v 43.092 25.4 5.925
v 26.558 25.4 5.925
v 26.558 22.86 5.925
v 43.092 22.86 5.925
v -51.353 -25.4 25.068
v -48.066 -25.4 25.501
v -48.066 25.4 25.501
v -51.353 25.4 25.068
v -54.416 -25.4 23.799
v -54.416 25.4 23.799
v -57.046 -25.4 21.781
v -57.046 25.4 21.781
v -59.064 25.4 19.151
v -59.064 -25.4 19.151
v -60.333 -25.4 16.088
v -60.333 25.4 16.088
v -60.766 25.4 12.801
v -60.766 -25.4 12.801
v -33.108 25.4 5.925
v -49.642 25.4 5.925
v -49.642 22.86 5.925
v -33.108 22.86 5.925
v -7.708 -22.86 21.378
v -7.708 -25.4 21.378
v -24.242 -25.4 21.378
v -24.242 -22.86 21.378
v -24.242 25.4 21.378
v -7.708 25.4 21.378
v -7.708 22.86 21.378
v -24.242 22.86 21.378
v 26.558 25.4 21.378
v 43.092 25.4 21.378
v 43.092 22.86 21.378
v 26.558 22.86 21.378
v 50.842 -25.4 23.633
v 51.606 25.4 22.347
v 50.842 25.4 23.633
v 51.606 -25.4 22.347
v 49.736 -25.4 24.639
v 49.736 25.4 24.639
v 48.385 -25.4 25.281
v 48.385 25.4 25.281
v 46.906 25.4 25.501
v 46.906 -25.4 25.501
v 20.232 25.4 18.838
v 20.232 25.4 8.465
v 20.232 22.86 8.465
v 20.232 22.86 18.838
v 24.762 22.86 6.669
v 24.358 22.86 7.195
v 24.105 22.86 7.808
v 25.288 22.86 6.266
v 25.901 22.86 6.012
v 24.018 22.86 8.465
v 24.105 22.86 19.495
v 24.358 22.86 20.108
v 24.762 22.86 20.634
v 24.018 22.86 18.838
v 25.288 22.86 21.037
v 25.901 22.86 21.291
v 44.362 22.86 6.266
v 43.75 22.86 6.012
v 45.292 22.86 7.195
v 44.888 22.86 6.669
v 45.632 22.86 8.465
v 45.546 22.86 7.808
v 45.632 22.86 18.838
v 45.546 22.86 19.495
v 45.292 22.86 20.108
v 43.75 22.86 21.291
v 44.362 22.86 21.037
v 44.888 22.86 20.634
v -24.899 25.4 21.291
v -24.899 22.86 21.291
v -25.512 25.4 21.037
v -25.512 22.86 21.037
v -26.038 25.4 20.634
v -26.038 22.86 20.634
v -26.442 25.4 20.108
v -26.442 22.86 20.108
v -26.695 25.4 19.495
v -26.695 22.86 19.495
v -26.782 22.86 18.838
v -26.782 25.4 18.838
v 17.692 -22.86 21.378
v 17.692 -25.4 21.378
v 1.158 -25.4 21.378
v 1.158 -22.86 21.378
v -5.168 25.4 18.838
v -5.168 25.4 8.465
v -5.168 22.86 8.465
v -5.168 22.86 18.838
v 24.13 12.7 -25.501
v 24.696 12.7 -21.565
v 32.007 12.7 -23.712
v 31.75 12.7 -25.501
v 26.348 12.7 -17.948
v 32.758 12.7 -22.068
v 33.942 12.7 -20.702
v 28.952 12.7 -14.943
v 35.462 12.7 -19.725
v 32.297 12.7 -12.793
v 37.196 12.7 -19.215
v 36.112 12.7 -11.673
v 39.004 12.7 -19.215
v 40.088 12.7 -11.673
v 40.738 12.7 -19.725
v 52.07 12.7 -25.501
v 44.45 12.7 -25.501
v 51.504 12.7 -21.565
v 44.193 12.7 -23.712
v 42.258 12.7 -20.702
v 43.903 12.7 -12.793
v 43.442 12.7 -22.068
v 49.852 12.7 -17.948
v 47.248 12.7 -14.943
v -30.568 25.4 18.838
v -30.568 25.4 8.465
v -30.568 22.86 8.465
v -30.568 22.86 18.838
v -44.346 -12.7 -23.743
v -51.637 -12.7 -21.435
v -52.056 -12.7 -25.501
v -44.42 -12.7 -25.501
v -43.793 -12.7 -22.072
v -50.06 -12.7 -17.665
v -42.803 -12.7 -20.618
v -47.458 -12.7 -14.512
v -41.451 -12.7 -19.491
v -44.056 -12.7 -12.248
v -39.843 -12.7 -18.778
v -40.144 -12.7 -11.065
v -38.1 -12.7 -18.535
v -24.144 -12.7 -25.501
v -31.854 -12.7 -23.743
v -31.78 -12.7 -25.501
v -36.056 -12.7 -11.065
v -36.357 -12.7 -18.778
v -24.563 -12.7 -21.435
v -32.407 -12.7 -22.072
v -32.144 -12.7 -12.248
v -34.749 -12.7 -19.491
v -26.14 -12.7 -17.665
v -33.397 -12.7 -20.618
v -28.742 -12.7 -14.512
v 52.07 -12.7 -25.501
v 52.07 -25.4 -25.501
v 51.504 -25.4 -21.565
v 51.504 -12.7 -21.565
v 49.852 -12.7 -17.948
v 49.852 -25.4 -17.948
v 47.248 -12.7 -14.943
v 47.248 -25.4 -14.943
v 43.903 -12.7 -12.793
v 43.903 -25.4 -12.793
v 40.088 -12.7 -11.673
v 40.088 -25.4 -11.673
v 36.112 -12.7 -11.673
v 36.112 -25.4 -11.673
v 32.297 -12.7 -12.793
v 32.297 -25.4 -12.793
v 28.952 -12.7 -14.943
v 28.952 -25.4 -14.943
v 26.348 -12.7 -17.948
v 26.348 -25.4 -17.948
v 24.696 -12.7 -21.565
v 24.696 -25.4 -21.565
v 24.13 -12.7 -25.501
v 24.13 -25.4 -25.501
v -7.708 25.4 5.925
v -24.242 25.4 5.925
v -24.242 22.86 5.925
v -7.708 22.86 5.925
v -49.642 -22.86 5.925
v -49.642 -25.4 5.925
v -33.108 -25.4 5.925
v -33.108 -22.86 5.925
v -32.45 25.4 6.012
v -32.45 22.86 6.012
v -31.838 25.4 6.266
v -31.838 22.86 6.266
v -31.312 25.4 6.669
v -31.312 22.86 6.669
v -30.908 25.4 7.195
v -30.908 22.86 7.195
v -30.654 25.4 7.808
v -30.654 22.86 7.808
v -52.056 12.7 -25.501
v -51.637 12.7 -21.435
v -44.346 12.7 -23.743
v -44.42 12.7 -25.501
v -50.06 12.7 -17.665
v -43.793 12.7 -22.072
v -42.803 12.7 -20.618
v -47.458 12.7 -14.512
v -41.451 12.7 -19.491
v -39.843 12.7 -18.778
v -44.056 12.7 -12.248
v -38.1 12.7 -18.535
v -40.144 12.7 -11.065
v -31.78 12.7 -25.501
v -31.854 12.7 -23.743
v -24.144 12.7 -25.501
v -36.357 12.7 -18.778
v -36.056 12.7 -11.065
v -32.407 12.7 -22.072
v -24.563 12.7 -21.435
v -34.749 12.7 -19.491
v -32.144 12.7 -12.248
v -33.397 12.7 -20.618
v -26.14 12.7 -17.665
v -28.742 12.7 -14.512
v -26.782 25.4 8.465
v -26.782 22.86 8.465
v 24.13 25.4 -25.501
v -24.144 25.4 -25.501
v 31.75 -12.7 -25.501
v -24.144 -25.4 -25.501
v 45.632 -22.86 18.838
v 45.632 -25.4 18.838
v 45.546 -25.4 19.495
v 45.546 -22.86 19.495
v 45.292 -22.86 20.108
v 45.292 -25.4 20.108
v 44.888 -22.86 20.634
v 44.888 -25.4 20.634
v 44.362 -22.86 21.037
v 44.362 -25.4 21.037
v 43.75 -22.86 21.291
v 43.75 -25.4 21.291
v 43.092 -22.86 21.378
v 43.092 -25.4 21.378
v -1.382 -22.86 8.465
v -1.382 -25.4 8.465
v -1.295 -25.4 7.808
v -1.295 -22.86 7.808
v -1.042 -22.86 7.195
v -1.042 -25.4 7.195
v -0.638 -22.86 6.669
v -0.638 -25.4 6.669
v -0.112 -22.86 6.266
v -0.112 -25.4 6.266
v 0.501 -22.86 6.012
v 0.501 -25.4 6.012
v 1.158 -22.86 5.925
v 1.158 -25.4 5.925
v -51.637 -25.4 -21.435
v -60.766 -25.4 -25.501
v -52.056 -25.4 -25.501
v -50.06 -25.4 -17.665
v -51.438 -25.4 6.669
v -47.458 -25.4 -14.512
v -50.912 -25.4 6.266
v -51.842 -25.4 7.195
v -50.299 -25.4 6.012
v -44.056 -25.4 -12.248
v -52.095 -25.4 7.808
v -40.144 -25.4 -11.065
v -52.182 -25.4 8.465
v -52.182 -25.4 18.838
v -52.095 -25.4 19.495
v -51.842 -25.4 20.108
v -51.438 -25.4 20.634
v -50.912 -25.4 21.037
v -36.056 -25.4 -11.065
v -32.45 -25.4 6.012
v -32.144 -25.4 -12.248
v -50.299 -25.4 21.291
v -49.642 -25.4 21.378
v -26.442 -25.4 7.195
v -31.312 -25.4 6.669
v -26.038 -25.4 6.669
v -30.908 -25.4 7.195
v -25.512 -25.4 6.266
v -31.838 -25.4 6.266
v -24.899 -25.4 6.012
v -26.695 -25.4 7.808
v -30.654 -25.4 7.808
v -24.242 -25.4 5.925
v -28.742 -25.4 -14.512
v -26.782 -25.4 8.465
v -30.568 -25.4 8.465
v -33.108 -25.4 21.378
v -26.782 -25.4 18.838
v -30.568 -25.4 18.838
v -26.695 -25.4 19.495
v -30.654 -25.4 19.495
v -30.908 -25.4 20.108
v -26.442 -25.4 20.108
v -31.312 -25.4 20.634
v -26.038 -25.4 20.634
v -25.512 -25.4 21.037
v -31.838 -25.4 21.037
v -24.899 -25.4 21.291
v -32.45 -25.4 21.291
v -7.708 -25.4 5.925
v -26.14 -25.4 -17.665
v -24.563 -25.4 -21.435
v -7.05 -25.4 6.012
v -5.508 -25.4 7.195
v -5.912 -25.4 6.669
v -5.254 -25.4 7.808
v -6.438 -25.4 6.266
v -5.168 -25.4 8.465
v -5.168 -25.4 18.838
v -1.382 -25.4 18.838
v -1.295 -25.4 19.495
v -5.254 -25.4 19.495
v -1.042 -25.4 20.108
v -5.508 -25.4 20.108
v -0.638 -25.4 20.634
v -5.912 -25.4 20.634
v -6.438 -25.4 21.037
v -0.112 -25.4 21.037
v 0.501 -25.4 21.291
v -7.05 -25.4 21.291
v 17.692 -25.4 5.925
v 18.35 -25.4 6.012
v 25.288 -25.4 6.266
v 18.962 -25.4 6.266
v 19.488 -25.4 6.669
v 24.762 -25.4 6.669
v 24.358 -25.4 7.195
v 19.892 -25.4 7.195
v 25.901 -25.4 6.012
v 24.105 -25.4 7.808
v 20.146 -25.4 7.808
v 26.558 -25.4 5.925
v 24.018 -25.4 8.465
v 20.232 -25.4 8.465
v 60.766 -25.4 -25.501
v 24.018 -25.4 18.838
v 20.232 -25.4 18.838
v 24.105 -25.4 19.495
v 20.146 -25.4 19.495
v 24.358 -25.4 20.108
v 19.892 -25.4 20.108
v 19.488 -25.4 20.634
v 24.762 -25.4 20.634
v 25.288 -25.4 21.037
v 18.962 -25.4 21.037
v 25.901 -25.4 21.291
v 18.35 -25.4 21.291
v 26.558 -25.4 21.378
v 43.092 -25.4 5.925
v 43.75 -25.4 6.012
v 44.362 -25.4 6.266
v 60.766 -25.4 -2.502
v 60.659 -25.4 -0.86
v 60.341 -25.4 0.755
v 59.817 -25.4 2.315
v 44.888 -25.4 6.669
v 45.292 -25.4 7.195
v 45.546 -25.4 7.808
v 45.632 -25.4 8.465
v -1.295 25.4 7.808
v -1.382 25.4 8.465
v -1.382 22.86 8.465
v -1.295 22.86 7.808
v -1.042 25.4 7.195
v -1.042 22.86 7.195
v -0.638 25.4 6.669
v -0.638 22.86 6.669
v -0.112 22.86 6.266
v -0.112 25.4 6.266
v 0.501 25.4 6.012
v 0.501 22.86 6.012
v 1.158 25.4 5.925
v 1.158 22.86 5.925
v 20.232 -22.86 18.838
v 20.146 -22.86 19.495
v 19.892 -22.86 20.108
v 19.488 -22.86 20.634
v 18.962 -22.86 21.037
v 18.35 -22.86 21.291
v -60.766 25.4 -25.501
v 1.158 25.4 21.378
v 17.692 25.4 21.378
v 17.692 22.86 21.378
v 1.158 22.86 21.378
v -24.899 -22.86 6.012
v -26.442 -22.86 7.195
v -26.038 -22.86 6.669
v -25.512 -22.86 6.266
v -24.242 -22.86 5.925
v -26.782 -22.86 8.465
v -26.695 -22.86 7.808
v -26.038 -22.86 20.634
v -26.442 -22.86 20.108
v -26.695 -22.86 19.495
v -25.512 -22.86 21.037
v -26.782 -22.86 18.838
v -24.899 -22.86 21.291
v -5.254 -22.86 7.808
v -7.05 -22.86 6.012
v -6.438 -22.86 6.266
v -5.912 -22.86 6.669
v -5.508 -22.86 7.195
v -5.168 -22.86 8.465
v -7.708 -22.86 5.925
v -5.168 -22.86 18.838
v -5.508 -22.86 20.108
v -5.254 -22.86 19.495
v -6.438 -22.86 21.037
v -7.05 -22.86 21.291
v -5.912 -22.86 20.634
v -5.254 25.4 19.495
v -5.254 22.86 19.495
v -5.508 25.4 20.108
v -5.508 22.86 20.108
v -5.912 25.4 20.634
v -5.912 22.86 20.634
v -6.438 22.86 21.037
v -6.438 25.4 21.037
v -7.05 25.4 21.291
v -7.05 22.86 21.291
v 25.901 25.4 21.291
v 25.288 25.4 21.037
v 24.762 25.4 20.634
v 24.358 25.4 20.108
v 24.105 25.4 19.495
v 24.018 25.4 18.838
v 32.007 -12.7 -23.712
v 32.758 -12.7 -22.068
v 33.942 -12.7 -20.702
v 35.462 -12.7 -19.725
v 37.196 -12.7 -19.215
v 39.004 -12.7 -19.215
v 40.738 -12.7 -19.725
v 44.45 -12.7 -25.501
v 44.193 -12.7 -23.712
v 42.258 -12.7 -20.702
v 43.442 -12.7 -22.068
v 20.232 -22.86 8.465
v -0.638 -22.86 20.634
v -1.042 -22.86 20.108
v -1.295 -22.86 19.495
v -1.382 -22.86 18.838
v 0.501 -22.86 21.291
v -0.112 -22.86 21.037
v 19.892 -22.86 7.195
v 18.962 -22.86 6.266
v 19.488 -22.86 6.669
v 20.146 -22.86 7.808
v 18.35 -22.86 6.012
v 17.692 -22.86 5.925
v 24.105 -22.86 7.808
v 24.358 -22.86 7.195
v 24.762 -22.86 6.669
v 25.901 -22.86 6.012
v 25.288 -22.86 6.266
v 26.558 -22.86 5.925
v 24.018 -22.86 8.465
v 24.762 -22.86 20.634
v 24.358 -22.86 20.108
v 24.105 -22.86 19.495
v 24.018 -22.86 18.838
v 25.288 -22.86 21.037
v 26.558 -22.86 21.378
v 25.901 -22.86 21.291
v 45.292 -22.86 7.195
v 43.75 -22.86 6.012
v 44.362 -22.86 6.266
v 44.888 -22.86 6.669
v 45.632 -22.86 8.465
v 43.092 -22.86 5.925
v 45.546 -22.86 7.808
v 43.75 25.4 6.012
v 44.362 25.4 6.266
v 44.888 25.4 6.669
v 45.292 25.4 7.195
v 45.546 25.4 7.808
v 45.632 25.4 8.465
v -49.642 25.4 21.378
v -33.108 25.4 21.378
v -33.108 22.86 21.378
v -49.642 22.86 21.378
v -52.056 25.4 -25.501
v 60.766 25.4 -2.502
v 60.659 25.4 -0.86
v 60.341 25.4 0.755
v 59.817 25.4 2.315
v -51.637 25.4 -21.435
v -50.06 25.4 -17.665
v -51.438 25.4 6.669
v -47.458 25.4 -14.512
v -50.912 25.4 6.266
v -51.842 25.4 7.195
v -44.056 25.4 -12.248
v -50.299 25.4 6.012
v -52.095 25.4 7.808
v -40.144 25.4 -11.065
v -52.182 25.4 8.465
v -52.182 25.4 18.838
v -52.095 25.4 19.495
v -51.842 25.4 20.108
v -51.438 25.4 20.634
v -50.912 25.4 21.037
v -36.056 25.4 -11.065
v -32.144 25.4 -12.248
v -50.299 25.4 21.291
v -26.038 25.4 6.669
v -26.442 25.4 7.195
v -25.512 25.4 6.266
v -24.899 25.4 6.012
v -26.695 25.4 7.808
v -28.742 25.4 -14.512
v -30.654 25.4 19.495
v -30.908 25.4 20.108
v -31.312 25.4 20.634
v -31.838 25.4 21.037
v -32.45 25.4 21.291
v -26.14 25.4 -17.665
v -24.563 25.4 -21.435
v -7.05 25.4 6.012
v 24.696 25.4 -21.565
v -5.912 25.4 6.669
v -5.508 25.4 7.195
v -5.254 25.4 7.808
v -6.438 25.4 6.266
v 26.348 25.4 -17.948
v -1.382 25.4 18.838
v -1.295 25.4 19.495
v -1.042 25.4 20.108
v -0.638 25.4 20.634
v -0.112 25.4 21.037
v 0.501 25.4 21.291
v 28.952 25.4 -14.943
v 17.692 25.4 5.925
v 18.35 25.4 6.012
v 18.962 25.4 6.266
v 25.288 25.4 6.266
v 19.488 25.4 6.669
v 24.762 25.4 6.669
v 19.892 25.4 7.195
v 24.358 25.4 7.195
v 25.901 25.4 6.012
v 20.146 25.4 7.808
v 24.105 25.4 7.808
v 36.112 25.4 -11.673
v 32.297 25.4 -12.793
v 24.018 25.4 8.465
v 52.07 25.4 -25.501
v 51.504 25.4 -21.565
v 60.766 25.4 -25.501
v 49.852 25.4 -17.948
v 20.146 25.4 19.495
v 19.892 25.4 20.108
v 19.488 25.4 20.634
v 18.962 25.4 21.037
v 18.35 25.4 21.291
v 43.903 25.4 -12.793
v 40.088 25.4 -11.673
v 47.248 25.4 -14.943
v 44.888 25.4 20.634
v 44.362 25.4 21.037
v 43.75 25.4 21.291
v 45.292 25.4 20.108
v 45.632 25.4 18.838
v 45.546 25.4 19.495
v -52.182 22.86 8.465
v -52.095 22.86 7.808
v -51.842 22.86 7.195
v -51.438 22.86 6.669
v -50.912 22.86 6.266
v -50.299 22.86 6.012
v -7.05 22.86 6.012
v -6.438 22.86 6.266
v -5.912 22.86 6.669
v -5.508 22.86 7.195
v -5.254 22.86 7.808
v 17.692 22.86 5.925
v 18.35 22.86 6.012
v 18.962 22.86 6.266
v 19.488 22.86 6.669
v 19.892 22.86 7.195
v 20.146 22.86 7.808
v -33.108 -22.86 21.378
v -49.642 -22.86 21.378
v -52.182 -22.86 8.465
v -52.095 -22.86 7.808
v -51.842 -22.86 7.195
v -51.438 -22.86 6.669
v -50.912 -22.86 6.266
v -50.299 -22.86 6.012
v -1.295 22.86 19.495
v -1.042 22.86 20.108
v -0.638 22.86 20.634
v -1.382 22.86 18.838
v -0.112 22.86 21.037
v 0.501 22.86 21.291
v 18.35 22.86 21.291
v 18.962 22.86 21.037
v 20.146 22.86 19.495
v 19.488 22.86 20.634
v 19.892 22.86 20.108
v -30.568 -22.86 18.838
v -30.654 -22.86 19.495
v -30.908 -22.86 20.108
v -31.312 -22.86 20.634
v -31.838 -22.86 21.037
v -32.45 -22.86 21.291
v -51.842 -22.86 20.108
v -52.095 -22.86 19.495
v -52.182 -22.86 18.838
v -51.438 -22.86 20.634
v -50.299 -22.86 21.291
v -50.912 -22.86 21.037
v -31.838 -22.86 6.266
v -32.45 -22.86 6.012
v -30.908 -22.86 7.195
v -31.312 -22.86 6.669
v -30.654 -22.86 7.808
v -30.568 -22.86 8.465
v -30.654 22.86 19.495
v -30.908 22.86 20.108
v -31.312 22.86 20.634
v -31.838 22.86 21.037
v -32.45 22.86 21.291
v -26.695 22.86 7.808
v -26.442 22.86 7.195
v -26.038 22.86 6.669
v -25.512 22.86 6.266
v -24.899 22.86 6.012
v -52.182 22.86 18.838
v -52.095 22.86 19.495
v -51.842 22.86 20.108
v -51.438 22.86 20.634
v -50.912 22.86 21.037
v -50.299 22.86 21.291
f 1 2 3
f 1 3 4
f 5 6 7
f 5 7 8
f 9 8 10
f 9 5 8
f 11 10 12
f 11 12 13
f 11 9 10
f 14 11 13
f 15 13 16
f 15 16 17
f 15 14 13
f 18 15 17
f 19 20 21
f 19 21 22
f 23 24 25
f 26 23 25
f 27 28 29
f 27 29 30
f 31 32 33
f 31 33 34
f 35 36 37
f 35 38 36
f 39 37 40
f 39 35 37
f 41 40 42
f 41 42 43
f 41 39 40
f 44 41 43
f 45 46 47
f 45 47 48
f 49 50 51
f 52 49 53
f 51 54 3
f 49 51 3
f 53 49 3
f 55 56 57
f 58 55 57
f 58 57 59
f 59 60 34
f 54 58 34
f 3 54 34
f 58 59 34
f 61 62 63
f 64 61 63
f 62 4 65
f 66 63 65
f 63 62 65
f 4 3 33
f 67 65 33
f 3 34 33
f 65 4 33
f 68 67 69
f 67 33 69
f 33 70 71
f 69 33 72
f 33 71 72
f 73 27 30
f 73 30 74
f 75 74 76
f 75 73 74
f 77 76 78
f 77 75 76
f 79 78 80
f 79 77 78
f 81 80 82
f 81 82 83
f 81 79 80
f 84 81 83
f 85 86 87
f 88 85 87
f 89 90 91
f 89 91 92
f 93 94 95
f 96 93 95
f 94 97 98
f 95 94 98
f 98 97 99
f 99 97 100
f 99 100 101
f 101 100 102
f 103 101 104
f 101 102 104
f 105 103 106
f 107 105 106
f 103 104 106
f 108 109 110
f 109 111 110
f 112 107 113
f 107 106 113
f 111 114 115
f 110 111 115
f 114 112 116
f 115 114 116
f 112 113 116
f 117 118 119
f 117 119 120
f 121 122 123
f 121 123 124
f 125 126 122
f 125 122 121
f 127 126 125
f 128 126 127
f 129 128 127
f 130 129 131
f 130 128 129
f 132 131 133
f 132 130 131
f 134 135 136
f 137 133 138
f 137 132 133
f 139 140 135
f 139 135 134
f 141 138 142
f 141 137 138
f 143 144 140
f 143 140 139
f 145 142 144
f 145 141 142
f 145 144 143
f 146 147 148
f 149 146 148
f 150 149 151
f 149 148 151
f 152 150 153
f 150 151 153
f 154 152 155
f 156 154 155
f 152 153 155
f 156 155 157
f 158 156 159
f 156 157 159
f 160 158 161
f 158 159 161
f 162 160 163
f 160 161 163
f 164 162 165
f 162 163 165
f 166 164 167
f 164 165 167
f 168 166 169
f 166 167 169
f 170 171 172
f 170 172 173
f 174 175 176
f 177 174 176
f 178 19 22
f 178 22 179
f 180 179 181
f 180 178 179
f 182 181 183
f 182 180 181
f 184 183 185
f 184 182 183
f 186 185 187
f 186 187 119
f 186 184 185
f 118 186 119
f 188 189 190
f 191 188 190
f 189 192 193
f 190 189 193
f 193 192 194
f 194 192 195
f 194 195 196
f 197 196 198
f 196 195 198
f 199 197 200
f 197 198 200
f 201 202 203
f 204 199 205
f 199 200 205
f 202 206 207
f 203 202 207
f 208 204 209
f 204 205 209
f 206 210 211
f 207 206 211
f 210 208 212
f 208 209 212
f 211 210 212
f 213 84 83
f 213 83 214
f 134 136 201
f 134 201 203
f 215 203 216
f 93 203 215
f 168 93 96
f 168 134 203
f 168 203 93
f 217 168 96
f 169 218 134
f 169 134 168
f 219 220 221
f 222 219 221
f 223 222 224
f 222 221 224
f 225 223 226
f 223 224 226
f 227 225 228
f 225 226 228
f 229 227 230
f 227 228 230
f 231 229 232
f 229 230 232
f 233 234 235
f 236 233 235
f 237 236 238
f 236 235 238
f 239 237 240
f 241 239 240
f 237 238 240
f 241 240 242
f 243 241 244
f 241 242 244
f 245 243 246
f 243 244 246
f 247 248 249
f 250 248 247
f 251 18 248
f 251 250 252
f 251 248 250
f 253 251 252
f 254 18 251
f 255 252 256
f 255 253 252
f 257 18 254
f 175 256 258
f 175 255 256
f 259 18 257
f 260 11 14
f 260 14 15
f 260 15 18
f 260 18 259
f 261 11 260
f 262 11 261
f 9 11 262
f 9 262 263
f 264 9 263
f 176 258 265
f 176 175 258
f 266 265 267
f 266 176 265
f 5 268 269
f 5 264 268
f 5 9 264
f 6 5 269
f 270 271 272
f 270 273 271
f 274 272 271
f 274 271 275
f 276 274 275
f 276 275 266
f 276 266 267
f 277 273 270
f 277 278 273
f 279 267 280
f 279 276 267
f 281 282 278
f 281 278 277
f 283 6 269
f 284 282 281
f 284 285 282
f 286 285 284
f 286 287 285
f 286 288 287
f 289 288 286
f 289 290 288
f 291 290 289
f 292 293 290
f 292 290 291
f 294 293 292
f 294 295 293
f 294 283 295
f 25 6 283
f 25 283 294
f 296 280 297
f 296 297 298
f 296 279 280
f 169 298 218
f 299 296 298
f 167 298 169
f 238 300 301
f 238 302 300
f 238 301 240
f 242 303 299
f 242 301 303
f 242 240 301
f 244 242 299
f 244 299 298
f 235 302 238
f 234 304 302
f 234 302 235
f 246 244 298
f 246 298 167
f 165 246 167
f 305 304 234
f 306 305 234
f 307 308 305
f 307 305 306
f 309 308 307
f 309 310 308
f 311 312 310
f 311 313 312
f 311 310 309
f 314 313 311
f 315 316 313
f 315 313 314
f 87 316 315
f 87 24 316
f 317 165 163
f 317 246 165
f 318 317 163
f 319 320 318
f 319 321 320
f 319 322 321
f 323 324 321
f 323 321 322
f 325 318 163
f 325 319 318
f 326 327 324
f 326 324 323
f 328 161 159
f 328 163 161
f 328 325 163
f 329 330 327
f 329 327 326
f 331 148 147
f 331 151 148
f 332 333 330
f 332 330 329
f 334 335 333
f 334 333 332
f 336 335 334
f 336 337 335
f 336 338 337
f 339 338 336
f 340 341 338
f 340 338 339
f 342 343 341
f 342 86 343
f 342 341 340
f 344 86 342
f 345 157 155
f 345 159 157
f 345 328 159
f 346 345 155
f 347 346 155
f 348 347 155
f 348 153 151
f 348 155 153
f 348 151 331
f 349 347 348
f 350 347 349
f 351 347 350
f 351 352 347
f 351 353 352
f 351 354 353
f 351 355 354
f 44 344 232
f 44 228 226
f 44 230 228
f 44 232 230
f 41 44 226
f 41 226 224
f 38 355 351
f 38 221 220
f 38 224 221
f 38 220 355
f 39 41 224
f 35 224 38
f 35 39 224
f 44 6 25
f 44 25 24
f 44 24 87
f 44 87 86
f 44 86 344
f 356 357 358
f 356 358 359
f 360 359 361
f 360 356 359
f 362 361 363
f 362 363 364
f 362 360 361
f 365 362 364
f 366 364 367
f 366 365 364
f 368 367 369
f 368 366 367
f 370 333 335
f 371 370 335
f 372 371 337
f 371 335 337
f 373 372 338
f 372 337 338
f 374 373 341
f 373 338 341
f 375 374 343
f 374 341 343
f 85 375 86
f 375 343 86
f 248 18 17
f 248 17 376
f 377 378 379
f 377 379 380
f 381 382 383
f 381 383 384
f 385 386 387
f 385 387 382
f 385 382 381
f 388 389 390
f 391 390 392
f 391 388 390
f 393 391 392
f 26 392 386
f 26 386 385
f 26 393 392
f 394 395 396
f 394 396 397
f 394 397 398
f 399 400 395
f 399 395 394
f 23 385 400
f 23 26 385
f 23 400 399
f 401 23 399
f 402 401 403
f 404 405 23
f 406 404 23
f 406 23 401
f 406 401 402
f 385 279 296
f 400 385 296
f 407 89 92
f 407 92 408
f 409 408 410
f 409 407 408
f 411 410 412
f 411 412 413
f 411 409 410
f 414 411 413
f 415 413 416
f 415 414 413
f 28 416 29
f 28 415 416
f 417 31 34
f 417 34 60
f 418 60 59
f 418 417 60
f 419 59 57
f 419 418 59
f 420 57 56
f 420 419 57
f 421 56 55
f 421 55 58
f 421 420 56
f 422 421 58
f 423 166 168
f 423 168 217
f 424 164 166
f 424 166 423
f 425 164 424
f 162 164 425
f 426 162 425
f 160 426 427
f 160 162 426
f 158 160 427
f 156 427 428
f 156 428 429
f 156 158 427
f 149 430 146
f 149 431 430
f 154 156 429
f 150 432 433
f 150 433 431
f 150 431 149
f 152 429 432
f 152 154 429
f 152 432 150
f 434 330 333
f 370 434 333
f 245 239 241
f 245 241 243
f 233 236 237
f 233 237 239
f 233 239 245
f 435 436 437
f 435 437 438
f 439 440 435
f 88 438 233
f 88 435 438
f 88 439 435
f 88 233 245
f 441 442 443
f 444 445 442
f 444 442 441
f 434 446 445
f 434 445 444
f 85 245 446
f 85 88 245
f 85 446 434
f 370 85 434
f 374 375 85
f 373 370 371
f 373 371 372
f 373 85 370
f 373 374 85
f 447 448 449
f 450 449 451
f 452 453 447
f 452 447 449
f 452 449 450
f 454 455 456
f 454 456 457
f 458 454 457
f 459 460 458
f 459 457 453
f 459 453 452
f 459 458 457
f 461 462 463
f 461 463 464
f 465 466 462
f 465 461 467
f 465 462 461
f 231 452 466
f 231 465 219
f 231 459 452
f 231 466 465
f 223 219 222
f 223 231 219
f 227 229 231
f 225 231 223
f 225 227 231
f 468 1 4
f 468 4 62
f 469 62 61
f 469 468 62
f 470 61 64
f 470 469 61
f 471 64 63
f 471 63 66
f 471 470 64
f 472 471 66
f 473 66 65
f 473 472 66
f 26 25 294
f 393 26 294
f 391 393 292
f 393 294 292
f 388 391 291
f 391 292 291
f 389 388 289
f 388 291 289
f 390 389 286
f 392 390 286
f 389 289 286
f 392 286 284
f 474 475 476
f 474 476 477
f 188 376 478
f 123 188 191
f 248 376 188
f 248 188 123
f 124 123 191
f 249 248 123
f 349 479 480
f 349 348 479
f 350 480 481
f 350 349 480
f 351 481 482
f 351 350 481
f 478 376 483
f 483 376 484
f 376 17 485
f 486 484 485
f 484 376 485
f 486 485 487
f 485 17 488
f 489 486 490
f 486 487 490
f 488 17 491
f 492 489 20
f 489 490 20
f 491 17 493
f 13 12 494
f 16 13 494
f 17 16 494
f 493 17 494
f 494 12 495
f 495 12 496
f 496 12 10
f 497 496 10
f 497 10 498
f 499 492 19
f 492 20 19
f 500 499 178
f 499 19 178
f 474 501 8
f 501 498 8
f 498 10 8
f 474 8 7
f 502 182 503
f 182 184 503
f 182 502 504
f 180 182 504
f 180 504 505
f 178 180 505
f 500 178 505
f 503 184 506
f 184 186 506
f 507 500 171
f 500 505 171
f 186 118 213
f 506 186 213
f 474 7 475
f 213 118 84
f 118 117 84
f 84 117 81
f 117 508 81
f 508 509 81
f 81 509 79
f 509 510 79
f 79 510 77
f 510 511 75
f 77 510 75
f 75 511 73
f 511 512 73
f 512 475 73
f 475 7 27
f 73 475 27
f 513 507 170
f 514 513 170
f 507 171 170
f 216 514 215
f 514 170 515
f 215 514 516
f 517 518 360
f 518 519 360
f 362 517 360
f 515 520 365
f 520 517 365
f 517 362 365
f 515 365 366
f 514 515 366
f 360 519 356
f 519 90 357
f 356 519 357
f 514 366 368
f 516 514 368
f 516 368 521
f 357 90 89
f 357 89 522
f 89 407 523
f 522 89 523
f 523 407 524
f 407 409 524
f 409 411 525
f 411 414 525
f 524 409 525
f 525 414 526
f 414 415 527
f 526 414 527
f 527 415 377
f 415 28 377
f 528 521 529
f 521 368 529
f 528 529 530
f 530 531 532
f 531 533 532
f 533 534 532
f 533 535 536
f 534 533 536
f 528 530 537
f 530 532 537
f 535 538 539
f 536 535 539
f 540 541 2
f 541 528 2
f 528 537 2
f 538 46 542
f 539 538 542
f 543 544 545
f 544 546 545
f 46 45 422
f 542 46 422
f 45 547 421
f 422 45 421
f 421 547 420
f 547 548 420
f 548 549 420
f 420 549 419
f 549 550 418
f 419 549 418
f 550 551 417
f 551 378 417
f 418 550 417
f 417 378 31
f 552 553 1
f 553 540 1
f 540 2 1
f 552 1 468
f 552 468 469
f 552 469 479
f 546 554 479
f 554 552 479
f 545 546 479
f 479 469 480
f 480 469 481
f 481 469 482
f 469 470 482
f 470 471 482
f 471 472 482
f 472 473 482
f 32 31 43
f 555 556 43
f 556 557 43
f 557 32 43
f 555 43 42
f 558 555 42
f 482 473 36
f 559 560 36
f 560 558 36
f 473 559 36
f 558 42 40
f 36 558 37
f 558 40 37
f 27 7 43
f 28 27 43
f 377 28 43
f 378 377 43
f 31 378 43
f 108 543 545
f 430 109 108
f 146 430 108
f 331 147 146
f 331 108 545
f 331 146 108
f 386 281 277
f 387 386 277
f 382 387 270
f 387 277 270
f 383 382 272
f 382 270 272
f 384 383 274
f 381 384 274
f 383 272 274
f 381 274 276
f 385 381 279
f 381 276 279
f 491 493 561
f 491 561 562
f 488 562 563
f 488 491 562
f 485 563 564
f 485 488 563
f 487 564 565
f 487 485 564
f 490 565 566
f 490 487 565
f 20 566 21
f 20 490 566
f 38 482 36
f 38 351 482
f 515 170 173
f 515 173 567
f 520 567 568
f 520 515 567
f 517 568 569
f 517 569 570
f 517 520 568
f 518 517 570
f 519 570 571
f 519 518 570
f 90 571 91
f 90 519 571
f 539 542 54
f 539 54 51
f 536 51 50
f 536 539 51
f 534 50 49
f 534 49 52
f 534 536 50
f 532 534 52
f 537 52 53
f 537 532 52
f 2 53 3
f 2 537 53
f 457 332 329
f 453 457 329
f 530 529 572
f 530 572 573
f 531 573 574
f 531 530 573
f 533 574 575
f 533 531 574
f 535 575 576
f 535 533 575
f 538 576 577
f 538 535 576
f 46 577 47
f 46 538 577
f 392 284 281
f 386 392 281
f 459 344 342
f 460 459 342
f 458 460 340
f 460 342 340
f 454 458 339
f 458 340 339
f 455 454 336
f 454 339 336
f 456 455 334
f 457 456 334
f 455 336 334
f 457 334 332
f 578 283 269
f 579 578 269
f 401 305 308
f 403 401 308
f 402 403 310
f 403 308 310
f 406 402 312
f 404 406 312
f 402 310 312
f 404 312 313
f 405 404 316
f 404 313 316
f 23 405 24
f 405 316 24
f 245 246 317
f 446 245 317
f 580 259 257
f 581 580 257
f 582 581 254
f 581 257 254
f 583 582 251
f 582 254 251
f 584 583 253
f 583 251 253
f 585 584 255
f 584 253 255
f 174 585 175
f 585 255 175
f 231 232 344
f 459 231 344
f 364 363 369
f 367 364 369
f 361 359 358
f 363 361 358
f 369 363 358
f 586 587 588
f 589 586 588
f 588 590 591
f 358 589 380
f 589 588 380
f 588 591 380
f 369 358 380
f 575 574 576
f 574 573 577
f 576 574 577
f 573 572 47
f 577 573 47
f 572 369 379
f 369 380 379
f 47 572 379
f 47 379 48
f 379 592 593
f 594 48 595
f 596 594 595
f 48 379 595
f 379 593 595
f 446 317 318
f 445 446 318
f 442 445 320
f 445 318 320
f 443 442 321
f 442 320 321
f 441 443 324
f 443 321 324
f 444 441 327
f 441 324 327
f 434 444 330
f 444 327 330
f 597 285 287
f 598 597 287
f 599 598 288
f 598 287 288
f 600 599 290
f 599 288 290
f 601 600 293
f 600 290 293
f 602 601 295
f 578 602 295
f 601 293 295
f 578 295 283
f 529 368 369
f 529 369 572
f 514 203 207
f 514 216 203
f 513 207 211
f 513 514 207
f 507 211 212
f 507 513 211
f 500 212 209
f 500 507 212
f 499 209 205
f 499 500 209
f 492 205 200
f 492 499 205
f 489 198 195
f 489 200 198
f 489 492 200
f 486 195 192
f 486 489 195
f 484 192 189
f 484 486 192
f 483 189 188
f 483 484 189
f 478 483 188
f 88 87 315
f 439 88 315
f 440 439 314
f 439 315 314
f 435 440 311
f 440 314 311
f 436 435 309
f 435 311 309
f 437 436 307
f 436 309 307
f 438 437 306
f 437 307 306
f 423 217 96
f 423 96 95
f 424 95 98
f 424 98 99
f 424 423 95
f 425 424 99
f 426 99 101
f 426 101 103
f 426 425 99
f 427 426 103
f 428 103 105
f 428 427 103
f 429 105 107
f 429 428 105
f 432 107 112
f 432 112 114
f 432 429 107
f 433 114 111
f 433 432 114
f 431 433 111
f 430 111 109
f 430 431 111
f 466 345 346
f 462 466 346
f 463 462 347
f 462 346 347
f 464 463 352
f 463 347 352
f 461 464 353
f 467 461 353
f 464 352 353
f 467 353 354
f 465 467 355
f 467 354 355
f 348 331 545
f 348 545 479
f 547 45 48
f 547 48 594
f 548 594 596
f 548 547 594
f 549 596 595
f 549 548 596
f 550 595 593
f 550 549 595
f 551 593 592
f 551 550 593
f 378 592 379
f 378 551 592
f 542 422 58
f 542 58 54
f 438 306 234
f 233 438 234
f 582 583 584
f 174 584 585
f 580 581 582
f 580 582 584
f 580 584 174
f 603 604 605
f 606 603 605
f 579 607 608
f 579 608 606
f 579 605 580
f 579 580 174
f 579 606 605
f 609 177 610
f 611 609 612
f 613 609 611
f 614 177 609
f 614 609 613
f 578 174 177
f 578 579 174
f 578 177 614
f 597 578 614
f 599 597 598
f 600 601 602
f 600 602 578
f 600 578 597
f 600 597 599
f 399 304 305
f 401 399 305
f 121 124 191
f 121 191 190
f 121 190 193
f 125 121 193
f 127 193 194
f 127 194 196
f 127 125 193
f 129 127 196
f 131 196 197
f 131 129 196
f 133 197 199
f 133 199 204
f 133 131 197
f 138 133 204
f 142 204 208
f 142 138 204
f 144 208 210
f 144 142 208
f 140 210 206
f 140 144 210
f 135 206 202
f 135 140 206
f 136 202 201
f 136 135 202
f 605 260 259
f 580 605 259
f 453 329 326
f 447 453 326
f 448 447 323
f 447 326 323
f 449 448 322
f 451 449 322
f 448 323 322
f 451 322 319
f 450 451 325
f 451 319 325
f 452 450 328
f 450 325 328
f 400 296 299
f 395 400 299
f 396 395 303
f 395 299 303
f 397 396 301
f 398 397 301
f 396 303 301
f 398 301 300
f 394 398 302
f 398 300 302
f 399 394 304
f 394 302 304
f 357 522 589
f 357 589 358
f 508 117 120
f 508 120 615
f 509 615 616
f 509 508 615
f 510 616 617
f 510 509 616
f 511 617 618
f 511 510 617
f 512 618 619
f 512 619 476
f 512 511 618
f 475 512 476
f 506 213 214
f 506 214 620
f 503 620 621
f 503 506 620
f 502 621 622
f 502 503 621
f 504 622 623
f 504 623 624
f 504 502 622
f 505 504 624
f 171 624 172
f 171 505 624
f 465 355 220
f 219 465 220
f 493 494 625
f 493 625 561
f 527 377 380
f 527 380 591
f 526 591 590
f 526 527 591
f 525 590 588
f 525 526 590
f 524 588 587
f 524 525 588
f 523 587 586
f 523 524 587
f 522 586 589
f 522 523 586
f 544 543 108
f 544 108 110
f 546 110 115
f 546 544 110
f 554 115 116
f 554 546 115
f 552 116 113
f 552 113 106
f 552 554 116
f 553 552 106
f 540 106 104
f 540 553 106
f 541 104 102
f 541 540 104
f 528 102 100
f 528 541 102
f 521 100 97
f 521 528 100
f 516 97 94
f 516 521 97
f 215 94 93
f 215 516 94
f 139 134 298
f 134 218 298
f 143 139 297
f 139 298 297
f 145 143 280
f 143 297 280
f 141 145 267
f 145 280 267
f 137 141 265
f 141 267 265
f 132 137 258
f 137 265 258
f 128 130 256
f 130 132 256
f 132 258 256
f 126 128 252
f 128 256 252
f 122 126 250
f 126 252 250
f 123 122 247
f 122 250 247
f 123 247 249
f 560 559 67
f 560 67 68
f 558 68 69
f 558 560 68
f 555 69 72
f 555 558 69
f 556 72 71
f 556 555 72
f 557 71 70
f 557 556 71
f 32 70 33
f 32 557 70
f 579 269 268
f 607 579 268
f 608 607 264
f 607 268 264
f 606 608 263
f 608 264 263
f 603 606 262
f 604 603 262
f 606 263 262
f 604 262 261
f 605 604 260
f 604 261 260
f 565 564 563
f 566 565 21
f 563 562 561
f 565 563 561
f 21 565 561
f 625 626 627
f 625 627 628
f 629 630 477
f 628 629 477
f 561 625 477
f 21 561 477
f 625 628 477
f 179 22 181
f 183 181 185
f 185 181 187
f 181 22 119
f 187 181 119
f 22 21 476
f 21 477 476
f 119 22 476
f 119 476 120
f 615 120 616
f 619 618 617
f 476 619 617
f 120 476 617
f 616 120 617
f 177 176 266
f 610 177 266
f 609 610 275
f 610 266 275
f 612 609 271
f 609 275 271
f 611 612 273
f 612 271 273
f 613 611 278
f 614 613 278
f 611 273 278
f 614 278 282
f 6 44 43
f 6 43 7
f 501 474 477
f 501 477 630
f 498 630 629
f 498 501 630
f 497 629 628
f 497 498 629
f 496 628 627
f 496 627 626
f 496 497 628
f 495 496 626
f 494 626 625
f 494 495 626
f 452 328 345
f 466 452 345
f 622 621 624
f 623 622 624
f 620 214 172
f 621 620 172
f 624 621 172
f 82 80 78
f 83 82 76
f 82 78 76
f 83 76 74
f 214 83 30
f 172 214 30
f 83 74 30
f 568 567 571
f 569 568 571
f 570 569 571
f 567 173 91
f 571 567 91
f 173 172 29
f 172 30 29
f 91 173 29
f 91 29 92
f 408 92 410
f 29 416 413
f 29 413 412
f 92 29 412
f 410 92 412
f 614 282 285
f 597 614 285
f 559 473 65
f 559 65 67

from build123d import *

# Parameters (mm, degrees)
F1_DEPTH = 25.4
F3_DEPTH = 2.54
F4_R     = 13.97
F5_DEPTH = 12.7


with BuildPart() as f1:
    # F0 (on Front) → F1 (new body)
    with BuildSketch(Plane.XZ):
        with BuildLine():
            ThreePointArc((51.606199, 22.347435), (49.735838, 24.639444), (46.905716, 25.500817))
            Line((46.905716, 25.500817), (-48.065889, 25.500817))
            ThreePointArc((-48.065889, 25.500817), (-57.046145, 21.781073), (-60.765889, 12.800817))
            Line((-60.765889, 12.800817), (-60.765889, -25.500817))
            Line((-60.765889, -25.500817), (-44.420032, -25.500817))
            ThreePointArc((-44.420032, -25.500817), (-38.1, -18.534626), (-31.779968, -25.500817))
            Line((-31.779968, -25.500817), (31.75, -25.500817))
            ThreePointArc((31.75, -25.500817), (38.1, -19.150817), (44.45, -25.500817))
            Line((44.45, -25.500817), (60.765889, -25.500817))
            Line((60.765889, -25.500817), (60.765889, -2.501722))
            ThreePointArc((60.765889, -2.501722), (60.526433, -0.047169), (59.817097, 2.314823))
            Line((59.817097, 2.314823), (51.606199, 22.347435))
        make_face()
    extrude(amount=F1_DEPTH)

    # F2 (on face) → F3 (cut)
    with BuildSketch(Plane.XZ.offset(25.4)):
        with BuildLine():
            Line((43.092143, 21.37755), (26.558064, 21.37755))
            ThreePointArc((26.558064, 21.37755), (24.762013, 20.633602), (24.018064, 18.83755))
            Line((24.018064, 18.83755), (24.018064, 8.465382))
            ThreePointArc((24.018064, 8.465382), (24.762013, 6.669331), (26.558064, 5.925382))
            Line((26.558064, 5.925382), (43.092143, 5.925382))
            ThreePointArc((43.092143, 5.925382), (44.888194, 6.669331), (45.632143, 8.465382))
            Line((45.632143, 8.465382), (45.632143, 18.83755))
            ThreePointArc((45.632143, 18.83755), (44.888194, 20.633602), (43.092143, 21.37755))
        make_face()
        with BuildLine():
            Line((20.232143, 8.465382), (20.232143, 18.83755))
            ThreePointArc((20.232143, 18.83755), (19.488194, 20.633602), (17.692143, 21.37755))
            Line((17.692143, 21.37755), (1.158064, 21.37755))
            ThreePointArc((1.158064, 21.37755), (-0.637987, 20.633602), (-1.381936, 18.83755))
            Line((-1.381936, 18.83755), (-1.381936, 8.465382))
            ThreePointArc((-1.381936, 8.465382), (-0.637987, 6.669331), (1.158064, 5.925382))
            Line((1.158064, 5.925382), (17.692143, 5.925382))
            ThreePointArc((17.692143, 5.925382), (19.488194, 6.669331), (20.232143, 8.465382))
        make_face()
        with BuildLine():
            Line((-5.167857, 8.465382), (-5.167857, 18.83755))
            ThreePointArc((-5.167857, 18.83755), (-5.911806, 20.633602), (-7.707857, 21.37755))
            Line((-7.707857, 21.37755), (-24.241936, 21.37755))
            ThreePointArc((-24.241936, 21.37755), (-26.037987, 20.633602), (-26.781936, 18.83755))
            Line((-26.781936, 18.83755), (-26.781936, 8.465382))
            ThreePointArc((-26.781936, 8.465382), (-26.037987, 6.669331), (-24.241936, 5.925382))
            Line((-24.241936, 5.925382), (-7.707857, 5.925382))
            ThreePointArc((-7.707857, 5.925382), (-5.911806, 6.669331), (-5.167857, 8.465382))
        make_face()
        with BuildLine():
            Line((-30.567857, 8.465382), (-30.567857, 18.83755))
            ThreePointArc((-30.567857, 18.83755), (-31.311806, 20.633602), (-33.107857, 21.37755))
            Line((-33.107857, 21.37755), (-49.641936, 21.37755))
            ThreePointArc((-49.641936, 21.37755), (-51.437987, 20.633602), (-52.181936, 18.83755))
            Line((-52.181936, 18.83755), (-52.181936, 8.465382))
            ThreePointArc((-52.181936, 8.465382), (-51.437987, 6.669331), (-49.641936, 5.925382))
            Line((-49.641936, 5.925382), (-33.107857, 5.925382))
            ThreePointArc((-33.107857, 5.925382), (-31.311806, 6.669331), (-30.567857, 8.465382))
        make_face()
    extrude(amount=-F3_DEPTH, mode=Mode.SUBTRACT)

    # F4 (on face) → F5 (cut)
    with BuildSketch(Plane.XZ.offset(25.4)):
        with Locations((-38.1, -24.884626)):
            Circle(F4_R)
        with Locations((38.1, -25.500817)):
            Circle(F4_R)
    extrude(amount=-F5_DEPTH, mode=Mode.SUBTRACT)

    # F6: F1 across plane


with BuildPart() as f1_1:
    add(f1.part)
    add(f1.part.mirror(Plane.XZ))


solid = f1_1.part
